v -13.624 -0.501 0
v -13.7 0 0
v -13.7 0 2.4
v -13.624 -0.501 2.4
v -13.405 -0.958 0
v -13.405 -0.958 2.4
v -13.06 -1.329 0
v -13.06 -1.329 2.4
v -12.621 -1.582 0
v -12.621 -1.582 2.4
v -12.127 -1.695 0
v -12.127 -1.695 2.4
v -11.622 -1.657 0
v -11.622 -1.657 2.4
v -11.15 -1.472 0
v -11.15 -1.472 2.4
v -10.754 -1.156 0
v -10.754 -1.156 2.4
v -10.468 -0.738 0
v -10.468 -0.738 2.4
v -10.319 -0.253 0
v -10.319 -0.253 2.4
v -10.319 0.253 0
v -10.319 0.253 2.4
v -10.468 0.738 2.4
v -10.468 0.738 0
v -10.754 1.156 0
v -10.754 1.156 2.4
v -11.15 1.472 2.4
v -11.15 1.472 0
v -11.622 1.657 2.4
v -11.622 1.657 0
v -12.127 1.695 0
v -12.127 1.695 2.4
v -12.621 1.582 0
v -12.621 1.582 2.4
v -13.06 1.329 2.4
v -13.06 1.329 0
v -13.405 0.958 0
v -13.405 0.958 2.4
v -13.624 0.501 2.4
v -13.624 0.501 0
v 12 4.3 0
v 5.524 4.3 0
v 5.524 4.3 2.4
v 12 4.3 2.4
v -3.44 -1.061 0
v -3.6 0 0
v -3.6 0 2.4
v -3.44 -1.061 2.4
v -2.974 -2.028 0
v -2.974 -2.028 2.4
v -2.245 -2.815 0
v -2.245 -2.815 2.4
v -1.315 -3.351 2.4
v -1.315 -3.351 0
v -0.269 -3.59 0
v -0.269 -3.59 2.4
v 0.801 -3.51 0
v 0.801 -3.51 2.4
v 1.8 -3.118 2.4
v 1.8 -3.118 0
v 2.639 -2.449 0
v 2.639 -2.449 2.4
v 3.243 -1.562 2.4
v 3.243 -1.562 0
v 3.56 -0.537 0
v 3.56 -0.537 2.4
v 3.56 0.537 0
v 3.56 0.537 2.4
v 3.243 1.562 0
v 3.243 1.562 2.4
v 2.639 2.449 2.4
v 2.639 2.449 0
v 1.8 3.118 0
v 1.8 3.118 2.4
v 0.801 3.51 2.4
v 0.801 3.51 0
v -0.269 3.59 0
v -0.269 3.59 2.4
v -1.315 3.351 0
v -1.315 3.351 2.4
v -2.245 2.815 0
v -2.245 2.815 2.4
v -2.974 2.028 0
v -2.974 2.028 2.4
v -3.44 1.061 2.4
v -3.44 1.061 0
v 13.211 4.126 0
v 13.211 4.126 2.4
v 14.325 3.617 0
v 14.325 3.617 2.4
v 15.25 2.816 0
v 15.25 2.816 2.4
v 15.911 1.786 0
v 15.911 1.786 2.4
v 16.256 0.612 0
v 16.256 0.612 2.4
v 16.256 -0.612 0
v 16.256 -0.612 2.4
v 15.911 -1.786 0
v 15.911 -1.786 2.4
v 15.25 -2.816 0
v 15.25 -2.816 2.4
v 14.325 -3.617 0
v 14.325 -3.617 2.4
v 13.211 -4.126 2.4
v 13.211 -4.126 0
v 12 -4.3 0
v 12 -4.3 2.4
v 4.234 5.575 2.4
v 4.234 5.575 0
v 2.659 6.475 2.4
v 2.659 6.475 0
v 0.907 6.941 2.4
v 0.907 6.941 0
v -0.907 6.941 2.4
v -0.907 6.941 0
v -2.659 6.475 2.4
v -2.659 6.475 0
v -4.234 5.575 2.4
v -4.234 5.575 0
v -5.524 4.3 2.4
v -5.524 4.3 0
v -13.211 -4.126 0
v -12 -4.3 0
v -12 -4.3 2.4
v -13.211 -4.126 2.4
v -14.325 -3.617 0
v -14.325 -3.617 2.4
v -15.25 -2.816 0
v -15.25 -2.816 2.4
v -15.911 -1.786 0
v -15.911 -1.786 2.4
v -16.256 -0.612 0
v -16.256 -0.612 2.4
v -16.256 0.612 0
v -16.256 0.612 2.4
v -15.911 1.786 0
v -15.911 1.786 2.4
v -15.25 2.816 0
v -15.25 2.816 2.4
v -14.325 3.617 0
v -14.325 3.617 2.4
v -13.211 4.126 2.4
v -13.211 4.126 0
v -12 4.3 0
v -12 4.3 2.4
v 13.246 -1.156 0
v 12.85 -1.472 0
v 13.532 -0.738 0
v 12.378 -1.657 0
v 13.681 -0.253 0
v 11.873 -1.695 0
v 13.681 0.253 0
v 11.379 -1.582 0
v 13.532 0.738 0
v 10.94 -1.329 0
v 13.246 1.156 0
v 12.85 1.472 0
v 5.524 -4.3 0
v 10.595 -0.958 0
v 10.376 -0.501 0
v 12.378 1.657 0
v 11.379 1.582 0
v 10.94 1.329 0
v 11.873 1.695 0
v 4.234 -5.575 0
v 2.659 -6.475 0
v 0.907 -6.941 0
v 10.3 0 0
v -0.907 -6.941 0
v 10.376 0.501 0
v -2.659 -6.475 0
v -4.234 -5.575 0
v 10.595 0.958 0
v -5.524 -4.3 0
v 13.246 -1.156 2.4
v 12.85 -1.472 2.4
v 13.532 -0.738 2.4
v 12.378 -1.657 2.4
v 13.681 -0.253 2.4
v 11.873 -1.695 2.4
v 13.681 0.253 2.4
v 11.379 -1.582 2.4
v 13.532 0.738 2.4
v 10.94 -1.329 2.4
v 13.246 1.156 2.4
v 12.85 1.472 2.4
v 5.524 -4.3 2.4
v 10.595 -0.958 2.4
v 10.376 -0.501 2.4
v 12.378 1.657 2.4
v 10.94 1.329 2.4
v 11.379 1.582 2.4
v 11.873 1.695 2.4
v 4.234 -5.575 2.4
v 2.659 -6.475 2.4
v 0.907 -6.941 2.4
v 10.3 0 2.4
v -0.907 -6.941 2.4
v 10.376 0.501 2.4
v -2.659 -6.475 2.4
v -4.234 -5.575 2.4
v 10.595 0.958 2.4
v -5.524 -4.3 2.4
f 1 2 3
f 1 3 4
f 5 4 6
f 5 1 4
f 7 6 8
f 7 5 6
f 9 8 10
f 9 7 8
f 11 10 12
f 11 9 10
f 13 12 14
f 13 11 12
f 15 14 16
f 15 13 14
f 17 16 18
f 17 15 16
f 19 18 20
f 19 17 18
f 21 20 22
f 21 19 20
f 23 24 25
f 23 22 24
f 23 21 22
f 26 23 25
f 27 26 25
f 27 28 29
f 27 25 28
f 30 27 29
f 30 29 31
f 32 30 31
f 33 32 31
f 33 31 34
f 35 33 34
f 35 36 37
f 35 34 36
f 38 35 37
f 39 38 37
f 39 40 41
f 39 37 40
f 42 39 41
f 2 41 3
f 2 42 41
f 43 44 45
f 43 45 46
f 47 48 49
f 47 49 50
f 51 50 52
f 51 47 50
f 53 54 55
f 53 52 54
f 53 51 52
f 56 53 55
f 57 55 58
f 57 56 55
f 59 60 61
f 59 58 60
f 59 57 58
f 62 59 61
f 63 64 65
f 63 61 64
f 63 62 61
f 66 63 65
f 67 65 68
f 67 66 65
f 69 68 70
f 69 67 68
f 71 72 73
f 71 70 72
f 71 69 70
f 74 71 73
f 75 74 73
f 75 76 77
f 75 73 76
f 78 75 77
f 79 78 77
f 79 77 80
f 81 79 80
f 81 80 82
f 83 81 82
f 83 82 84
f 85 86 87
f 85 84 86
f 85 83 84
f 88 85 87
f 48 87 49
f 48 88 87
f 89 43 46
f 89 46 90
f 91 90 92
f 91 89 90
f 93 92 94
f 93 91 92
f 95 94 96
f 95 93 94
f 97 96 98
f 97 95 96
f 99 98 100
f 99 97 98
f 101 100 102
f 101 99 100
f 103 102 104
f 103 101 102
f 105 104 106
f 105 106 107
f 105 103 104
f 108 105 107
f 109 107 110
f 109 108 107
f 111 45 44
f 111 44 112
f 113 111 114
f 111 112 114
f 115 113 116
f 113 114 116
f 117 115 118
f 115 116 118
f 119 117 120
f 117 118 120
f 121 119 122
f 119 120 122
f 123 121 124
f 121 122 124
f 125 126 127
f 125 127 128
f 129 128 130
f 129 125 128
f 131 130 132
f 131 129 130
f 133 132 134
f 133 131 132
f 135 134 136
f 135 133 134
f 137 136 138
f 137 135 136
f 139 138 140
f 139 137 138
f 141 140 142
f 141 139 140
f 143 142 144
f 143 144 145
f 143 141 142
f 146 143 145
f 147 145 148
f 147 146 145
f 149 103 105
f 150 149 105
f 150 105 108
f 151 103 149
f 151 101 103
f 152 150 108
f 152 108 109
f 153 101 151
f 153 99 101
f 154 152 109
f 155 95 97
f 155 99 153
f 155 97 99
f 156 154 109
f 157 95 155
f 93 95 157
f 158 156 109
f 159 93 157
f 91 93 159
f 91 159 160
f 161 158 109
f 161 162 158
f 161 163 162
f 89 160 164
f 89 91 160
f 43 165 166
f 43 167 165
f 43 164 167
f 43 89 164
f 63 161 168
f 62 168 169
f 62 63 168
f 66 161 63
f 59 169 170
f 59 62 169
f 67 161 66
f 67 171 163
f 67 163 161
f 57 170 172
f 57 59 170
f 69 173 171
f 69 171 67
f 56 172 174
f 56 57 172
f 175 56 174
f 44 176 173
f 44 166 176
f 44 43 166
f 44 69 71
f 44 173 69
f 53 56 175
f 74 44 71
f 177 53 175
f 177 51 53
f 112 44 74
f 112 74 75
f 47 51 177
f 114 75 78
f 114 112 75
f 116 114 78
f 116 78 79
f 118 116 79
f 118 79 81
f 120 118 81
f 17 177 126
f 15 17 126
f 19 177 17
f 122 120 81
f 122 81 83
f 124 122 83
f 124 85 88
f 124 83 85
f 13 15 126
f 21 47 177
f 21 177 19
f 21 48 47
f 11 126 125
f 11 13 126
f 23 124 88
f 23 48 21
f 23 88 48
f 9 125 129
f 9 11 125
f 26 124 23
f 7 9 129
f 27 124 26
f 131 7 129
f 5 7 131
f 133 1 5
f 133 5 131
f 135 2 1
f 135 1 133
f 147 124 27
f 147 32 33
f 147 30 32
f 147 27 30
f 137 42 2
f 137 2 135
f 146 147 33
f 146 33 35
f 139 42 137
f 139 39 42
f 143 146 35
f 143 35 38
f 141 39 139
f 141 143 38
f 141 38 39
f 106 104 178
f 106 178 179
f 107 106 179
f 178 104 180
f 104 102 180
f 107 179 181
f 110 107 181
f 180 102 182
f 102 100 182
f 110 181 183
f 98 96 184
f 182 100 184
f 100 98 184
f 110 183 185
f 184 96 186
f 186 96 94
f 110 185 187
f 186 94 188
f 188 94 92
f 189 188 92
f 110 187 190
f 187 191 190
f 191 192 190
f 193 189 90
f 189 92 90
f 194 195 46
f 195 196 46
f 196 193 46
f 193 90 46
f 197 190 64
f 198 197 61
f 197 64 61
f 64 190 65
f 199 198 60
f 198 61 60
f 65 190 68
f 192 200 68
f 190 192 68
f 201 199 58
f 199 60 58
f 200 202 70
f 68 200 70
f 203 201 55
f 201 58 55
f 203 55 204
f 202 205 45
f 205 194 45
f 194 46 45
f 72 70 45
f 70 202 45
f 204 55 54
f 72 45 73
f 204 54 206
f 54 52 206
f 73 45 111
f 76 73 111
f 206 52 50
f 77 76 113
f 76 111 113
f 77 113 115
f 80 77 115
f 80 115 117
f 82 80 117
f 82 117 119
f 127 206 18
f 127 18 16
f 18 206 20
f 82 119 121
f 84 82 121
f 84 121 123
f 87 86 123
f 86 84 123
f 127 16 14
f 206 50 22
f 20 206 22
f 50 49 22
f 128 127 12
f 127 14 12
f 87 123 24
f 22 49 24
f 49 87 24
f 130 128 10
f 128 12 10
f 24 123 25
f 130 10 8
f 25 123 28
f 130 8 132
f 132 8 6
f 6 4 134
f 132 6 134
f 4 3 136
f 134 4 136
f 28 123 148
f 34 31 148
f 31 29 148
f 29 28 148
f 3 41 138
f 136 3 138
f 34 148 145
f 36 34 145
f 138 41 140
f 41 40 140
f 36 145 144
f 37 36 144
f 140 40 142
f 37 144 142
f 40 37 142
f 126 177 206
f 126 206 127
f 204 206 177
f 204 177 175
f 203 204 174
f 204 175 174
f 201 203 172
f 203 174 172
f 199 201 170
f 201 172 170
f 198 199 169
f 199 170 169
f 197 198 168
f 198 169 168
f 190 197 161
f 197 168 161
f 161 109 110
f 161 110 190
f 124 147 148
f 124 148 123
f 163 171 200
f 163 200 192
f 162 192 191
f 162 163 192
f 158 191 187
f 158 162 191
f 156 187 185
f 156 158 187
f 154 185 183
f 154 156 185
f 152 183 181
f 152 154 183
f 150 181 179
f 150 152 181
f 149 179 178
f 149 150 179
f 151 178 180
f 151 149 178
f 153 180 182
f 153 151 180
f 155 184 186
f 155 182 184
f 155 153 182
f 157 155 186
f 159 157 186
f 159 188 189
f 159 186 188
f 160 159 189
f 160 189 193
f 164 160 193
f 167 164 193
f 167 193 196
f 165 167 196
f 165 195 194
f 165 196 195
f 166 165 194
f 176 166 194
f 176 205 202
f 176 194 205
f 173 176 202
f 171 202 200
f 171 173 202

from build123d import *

# Parameters (mm, degrees)
F_01_REMOVABLE_TWO_BOLT_NUT_KEEPER_DEPTH       = 2.4
S02_NUT_RETAINING_FACE_R                       = 7
F_02_NUT_RETAINING_FACE_DEPTH                  = 2.4
F_03_START                                     = -0.1
S03_SCREW_END_AND_TWO_M3_FASTENER_HOLE_R       = 3.6
S03_SCREW_END_AND_TWO_M3_FASTENER_HOLE_R_2     = 1.7
F_03_SCREW_END_AND_TWO_M3_FASTENER_HOLES_DEPTH = 2.6


with BuildPart() as part:
    # S01 - Removable two-bolt nut keeper → 01 - Removable two-bolt nut keeper (new body)
    with BuildSketch(Plane.XY):
        with BuildLine():
            Line((-12, 4.3), (12, 4.3))
            ThreePointArc((12, 4.3), (16.3, 0), (12, -4.3))
            Line((12, -4.3), (-12, -4.3))
            ThreePointArc((-12, -4.3), (-16.3, 0), (-12, 4.3))
        make_face()
    extrude(amount=F_01_REMOVABLE_TWO_BOLT_NUT_KEEPER_DEPTH)

    # S02 - Nut retaining face → 02 - Nut retaining face (add)
    with BuildSketch(Plane.XY):
        Circle(S02_NUT_RETAINING_FACE_R)
    extrude(amount=F_02_NUT_RETAINING_FACE_DEPTH)

    # S03 - Screw end and two M3 fastener holes → 03 - Screw end and two M3 fastener holes (cut)
    with BuildSketch(Plane.XY.offset(F_03_START)):
        with Locations(Location((0, 0, 0), (0, 0, 180))):
            Circle(S03_SCREW_END_AND_TWO_M3_FASTENER_HOLE_R)
        with Locations(Location((-12, 0, 0), (0, 0, 180))):
            Circle(S03_SCREW_END_AND_TWO_M3_FASTENER_HOLE_R_2)
        with Locations(Location((12, 0, 0), (0, 0, 180))):
            Circle(S03_SCREW_END_AND_TWO_M3_FASTENER_HOLE_R_2)
    extrude(amount=F_03_SCREW_END_AND_TWO_M3_FASTENER_HOLES_DEPTH, mode=Mode.SUBTRACT)


solid = part.part
